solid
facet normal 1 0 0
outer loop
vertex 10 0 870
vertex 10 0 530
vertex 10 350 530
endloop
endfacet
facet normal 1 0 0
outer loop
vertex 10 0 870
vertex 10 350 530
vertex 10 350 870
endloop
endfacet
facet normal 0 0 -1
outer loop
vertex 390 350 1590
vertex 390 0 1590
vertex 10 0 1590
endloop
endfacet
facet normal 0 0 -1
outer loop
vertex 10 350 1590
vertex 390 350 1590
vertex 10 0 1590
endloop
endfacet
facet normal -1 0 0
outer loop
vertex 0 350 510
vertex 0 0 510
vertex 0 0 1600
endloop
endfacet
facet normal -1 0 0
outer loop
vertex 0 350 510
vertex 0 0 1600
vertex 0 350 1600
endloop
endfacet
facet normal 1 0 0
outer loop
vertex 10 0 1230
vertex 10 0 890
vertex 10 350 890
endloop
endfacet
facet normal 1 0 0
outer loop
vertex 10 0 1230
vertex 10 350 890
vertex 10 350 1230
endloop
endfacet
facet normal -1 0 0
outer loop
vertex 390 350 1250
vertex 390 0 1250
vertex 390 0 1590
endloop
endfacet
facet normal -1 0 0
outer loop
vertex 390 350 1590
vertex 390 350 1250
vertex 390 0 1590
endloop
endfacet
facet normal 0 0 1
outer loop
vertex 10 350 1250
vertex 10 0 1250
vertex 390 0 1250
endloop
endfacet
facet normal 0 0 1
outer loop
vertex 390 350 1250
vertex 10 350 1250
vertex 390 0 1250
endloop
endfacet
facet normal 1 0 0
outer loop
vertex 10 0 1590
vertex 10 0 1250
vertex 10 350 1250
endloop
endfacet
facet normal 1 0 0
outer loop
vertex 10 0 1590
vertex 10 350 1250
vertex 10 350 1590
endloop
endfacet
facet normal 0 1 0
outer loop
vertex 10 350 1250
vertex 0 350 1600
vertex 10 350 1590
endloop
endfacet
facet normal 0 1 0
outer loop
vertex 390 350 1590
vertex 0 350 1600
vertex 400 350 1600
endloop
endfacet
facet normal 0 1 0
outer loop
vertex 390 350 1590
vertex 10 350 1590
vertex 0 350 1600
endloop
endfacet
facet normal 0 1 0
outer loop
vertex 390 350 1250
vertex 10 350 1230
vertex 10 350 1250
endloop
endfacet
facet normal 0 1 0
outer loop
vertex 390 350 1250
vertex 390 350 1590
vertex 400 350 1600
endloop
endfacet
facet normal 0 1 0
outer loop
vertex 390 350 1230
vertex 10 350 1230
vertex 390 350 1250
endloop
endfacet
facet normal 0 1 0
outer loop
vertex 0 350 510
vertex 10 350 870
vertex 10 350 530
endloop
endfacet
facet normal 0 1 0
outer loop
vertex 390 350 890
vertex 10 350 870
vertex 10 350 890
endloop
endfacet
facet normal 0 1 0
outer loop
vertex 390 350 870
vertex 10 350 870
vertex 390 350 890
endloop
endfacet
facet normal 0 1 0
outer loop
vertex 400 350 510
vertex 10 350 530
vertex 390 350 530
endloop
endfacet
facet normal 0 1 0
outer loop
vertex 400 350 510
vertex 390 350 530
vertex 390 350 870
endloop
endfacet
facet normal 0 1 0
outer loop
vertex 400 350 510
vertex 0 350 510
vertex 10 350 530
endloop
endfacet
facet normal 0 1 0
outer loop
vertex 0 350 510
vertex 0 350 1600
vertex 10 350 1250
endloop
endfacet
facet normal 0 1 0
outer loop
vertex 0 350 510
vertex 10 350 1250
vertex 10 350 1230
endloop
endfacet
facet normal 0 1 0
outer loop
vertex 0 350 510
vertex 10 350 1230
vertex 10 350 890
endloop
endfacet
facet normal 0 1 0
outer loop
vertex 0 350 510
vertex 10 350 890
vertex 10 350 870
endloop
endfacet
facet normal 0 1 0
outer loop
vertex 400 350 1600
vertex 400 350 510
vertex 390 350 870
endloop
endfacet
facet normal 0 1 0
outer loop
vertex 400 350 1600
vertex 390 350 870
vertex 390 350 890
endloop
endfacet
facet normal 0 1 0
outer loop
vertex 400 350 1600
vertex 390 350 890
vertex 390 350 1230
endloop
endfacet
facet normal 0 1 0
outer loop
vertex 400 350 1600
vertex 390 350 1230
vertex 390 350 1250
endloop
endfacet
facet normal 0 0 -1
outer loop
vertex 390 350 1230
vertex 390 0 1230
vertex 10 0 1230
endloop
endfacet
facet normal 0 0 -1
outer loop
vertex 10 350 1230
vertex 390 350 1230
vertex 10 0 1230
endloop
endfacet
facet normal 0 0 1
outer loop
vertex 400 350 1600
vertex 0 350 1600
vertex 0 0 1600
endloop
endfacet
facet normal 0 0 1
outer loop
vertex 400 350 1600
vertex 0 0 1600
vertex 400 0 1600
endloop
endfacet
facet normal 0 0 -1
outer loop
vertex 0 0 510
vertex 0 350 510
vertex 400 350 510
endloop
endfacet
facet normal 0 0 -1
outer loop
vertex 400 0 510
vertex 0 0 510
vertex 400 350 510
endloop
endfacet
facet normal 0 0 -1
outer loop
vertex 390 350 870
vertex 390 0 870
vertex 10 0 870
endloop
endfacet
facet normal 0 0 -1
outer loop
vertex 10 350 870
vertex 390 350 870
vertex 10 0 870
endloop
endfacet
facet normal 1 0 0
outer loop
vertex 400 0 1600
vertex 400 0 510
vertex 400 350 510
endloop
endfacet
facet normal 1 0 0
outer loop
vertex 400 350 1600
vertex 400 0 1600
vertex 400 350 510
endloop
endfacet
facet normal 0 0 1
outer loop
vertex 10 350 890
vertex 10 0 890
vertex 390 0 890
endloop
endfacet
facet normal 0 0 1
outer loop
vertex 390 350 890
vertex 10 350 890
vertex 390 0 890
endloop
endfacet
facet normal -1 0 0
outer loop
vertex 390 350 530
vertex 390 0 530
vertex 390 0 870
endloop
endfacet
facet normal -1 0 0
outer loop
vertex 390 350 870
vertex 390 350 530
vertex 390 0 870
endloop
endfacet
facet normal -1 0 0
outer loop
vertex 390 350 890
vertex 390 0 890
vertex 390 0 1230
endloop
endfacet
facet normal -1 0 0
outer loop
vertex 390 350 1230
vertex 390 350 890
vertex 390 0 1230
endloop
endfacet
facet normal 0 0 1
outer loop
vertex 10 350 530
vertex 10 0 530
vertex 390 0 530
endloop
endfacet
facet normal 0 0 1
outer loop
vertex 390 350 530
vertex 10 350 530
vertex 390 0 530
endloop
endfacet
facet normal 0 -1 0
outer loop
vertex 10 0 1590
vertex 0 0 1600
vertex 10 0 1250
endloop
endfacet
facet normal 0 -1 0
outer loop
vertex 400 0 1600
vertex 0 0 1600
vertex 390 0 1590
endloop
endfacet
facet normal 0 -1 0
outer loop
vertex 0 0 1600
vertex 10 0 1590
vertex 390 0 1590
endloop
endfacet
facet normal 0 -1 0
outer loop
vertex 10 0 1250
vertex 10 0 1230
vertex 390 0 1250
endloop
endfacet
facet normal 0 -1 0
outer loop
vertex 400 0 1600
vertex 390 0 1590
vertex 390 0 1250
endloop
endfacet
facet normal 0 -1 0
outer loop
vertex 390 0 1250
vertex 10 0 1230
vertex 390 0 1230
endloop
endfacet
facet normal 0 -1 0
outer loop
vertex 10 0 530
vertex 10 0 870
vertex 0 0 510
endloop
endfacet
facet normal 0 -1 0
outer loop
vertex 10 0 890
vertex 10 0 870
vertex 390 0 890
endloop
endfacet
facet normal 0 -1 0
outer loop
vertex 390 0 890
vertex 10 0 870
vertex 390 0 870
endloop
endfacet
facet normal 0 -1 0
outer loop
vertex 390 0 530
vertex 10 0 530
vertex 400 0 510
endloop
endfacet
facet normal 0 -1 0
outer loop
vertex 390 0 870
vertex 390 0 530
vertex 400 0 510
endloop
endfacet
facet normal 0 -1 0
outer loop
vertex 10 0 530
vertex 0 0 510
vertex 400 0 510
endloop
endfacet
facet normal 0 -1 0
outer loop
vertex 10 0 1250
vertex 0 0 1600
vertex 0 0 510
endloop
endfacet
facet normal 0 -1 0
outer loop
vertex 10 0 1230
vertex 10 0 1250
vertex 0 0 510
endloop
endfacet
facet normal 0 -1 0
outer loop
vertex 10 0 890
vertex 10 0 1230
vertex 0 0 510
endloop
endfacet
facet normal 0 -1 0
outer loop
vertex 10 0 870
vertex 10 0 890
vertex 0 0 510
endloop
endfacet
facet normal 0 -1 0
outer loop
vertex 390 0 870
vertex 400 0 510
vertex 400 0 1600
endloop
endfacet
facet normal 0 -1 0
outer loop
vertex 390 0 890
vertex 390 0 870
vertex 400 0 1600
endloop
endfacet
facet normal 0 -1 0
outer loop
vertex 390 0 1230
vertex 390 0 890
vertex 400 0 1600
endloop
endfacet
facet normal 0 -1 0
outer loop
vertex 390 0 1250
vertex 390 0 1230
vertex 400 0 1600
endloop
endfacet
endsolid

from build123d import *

# Parameters (mm, degrees)
F0_W     = 400
F0_H     = 350
F1_DEPTH = 1600
F2_W     = 190
F2_H     = 340
F3_DEPTH = 350
F4_DEPTH = 500
F5_DEPTH = 10


# Not quite as in the source:
# - a feature names something its author has since deleted; it is built from what else it names


with BuildPart() as f1:
    # F0 (on Top) → F1 (new body)
    with BuildSketch(Plane.XY):
        with Locations((200, 175)):
            Rectangle(F0_W, F0_H)
    extrude(amount=F1_DEPTH)

    # F2 (on face) → F3 (cut)
    with BuildSketch(Plane.XZ):
        with Locations((295, 1420)):
            Rectangle(F2_W, F2_H)
        with Locations((105, 1420)):
            Rectangle(F2_W, F2_H)
        with Locations((105, 1060)):
            Rectangle(F2_W, F2_H)
        with Locations((295, 1060)):
            Rectangle(F2_W, F2_H)
        with Locations((295, 700)):
            Rectangle(F2_W, F2_H)
        with Locations((105, 700)):
            Rectangle(F2_W, F2_H)
    extrude(amount=-F3_DEPTH, mode=Mode.SUBTRACT)

    # F4 (cut): a face of the model
    f4_faces = [f1.faces().sort_by_distance(p)[0] for p in [
        (200, 175, 0),
    ]]
    extrude(f4_faces, amount=-F4_DEPTH, mode=Mode.SUBTRACT)

    # F5 (cut): a face of the model
    f5_faces = [f1.faces().sort_by_distance(p)[0] for p in [
        (200, 175, 500),
    ]]
    extrude(f5_faces, amount=-F5_DEPTH, mode=Mode.SUBTRACT)


solid = f1.part
